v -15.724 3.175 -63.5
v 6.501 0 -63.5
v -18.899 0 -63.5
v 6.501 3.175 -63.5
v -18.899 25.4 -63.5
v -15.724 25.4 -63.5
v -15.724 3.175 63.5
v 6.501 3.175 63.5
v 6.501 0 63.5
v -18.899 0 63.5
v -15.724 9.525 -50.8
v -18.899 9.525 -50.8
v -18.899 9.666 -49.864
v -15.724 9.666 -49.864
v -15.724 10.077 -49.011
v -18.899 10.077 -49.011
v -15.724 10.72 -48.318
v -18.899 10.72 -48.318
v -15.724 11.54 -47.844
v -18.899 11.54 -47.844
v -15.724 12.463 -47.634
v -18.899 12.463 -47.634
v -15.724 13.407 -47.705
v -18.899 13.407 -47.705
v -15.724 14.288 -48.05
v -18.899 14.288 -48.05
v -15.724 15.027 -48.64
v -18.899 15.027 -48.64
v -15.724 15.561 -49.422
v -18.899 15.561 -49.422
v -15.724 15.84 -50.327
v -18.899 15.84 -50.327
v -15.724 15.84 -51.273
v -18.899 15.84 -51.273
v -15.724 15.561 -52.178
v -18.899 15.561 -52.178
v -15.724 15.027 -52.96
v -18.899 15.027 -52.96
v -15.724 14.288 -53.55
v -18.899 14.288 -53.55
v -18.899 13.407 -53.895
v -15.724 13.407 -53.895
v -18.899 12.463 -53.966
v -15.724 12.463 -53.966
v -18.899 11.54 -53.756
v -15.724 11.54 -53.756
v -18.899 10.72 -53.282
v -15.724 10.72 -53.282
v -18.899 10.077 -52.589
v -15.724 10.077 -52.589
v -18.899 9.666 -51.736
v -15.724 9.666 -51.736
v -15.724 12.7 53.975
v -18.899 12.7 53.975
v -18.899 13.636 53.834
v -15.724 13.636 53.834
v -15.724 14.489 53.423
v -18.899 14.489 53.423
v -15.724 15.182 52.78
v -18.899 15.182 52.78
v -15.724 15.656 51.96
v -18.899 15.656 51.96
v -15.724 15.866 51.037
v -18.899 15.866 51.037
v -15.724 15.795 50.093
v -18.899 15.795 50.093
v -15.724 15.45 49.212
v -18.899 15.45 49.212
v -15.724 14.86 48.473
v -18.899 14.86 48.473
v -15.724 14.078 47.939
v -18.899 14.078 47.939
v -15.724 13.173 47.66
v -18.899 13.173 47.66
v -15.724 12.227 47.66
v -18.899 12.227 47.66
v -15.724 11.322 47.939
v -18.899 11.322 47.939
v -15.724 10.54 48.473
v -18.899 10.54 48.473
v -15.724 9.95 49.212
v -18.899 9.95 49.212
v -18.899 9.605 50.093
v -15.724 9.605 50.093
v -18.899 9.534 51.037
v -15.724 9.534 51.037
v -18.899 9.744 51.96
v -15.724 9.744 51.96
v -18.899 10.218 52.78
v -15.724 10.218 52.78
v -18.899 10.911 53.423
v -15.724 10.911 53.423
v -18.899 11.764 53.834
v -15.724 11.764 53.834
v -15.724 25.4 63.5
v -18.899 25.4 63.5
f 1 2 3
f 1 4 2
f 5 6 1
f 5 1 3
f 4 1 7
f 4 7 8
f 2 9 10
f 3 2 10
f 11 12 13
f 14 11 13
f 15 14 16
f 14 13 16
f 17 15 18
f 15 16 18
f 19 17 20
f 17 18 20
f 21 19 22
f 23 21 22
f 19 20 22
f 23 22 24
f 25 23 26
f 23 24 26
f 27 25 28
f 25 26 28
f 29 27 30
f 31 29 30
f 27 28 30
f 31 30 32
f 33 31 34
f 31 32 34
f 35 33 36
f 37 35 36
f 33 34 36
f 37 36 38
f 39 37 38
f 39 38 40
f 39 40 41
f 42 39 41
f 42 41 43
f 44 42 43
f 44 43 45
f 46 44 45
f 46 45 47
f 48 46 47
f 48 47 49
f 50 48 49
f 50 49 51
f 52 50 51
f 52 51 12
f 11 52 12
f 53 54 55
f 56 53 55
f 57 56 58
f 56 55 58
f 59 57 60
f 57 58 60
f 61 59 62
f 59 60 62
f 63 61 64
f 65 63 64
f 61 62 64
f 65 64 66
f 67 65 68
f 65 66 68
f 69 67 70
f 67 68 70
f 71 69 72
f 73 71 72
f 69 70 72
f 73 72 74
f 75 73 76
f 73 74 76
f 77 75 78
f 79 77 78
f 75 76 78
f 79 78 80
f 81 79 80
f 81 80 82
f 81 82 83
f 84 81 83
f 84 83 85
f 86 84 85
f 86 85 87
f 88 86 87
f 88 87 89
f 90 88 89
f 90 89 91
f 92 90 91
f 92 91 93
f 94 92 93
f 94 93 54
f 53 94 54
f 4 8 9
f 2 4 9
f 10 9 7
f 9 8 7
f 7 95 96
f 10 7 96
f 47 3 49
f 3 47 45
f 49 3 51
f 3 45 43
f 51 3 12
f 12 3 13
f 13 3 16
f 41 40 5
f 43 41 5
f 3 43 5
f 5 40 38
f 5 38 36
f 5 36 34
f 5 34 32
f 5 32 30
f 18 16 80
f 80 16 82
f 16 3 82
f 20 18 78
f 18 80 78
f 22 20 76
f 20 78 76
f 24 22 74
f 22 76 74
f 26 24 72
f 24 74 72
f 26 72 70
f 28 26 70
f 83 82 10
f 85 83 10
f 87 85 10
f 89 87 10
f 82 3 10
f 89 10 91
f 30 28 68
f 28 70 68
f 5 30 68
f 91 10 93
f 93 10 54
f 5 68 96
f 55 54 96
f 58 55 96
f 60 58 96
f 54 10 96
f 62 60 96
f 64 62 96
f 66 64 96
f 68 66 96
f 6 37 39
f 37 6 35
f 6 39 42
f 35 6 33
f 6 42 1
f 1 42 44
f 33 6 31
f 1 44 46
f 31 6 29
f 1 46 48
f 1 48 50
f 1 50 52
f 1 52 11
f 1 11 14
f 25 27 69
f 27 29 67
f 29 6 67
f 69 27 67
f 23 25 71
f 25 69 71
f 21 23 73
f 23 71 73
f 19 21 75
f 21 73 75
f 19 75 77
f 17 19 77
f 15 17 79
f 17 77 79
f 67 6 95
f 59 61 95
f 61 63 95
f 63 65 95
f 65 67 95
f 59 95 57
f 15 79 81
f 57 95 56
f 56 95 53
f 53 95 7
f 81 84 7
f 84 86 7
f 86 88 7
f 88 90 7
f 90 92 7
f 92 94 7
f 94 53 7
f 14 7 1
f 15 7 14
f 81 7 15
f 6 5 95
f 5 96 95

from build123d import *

# Parameters (mm, degrees)
BOSS_EXTRUDE1_DEPTH = 63.5
SKETCH2_R           = 3.175
CUT_EXTRUDE1_DEPTH  = 127


with BuildPart() as part:
    # Sketch1 → Boss-Extrude1 (new, symmetric)
    with BuildSketch(Plane.XY):
        Polygon((6.500914077, 0), (-18.899085923, 0), (-18.899085923, 25.4), (-15.724085923, 25.4), (-15.724085923, 3.175), (6.500914077, 3.175), align=None)
    extrude(amount=BOSS_EXTRUDE1_DEPTH, both=True)

    # Sketch2 → Cut-Extrude1 (cut)
    with BuildSketch(Plane.ZY.offset(18.899085923)):
        with Locations((50.8, 12.7)):
            Circle(SKETCH2_R)
        with Locations(Location((-50.8, 12.7, 0), (0, 0, 270))):
            Circle(SKETCH2_R)
    extrude(amount=-CUT_EXTRUDE1_DEPTH, mode=Mode.SUBTRACT)


solid = part.part
